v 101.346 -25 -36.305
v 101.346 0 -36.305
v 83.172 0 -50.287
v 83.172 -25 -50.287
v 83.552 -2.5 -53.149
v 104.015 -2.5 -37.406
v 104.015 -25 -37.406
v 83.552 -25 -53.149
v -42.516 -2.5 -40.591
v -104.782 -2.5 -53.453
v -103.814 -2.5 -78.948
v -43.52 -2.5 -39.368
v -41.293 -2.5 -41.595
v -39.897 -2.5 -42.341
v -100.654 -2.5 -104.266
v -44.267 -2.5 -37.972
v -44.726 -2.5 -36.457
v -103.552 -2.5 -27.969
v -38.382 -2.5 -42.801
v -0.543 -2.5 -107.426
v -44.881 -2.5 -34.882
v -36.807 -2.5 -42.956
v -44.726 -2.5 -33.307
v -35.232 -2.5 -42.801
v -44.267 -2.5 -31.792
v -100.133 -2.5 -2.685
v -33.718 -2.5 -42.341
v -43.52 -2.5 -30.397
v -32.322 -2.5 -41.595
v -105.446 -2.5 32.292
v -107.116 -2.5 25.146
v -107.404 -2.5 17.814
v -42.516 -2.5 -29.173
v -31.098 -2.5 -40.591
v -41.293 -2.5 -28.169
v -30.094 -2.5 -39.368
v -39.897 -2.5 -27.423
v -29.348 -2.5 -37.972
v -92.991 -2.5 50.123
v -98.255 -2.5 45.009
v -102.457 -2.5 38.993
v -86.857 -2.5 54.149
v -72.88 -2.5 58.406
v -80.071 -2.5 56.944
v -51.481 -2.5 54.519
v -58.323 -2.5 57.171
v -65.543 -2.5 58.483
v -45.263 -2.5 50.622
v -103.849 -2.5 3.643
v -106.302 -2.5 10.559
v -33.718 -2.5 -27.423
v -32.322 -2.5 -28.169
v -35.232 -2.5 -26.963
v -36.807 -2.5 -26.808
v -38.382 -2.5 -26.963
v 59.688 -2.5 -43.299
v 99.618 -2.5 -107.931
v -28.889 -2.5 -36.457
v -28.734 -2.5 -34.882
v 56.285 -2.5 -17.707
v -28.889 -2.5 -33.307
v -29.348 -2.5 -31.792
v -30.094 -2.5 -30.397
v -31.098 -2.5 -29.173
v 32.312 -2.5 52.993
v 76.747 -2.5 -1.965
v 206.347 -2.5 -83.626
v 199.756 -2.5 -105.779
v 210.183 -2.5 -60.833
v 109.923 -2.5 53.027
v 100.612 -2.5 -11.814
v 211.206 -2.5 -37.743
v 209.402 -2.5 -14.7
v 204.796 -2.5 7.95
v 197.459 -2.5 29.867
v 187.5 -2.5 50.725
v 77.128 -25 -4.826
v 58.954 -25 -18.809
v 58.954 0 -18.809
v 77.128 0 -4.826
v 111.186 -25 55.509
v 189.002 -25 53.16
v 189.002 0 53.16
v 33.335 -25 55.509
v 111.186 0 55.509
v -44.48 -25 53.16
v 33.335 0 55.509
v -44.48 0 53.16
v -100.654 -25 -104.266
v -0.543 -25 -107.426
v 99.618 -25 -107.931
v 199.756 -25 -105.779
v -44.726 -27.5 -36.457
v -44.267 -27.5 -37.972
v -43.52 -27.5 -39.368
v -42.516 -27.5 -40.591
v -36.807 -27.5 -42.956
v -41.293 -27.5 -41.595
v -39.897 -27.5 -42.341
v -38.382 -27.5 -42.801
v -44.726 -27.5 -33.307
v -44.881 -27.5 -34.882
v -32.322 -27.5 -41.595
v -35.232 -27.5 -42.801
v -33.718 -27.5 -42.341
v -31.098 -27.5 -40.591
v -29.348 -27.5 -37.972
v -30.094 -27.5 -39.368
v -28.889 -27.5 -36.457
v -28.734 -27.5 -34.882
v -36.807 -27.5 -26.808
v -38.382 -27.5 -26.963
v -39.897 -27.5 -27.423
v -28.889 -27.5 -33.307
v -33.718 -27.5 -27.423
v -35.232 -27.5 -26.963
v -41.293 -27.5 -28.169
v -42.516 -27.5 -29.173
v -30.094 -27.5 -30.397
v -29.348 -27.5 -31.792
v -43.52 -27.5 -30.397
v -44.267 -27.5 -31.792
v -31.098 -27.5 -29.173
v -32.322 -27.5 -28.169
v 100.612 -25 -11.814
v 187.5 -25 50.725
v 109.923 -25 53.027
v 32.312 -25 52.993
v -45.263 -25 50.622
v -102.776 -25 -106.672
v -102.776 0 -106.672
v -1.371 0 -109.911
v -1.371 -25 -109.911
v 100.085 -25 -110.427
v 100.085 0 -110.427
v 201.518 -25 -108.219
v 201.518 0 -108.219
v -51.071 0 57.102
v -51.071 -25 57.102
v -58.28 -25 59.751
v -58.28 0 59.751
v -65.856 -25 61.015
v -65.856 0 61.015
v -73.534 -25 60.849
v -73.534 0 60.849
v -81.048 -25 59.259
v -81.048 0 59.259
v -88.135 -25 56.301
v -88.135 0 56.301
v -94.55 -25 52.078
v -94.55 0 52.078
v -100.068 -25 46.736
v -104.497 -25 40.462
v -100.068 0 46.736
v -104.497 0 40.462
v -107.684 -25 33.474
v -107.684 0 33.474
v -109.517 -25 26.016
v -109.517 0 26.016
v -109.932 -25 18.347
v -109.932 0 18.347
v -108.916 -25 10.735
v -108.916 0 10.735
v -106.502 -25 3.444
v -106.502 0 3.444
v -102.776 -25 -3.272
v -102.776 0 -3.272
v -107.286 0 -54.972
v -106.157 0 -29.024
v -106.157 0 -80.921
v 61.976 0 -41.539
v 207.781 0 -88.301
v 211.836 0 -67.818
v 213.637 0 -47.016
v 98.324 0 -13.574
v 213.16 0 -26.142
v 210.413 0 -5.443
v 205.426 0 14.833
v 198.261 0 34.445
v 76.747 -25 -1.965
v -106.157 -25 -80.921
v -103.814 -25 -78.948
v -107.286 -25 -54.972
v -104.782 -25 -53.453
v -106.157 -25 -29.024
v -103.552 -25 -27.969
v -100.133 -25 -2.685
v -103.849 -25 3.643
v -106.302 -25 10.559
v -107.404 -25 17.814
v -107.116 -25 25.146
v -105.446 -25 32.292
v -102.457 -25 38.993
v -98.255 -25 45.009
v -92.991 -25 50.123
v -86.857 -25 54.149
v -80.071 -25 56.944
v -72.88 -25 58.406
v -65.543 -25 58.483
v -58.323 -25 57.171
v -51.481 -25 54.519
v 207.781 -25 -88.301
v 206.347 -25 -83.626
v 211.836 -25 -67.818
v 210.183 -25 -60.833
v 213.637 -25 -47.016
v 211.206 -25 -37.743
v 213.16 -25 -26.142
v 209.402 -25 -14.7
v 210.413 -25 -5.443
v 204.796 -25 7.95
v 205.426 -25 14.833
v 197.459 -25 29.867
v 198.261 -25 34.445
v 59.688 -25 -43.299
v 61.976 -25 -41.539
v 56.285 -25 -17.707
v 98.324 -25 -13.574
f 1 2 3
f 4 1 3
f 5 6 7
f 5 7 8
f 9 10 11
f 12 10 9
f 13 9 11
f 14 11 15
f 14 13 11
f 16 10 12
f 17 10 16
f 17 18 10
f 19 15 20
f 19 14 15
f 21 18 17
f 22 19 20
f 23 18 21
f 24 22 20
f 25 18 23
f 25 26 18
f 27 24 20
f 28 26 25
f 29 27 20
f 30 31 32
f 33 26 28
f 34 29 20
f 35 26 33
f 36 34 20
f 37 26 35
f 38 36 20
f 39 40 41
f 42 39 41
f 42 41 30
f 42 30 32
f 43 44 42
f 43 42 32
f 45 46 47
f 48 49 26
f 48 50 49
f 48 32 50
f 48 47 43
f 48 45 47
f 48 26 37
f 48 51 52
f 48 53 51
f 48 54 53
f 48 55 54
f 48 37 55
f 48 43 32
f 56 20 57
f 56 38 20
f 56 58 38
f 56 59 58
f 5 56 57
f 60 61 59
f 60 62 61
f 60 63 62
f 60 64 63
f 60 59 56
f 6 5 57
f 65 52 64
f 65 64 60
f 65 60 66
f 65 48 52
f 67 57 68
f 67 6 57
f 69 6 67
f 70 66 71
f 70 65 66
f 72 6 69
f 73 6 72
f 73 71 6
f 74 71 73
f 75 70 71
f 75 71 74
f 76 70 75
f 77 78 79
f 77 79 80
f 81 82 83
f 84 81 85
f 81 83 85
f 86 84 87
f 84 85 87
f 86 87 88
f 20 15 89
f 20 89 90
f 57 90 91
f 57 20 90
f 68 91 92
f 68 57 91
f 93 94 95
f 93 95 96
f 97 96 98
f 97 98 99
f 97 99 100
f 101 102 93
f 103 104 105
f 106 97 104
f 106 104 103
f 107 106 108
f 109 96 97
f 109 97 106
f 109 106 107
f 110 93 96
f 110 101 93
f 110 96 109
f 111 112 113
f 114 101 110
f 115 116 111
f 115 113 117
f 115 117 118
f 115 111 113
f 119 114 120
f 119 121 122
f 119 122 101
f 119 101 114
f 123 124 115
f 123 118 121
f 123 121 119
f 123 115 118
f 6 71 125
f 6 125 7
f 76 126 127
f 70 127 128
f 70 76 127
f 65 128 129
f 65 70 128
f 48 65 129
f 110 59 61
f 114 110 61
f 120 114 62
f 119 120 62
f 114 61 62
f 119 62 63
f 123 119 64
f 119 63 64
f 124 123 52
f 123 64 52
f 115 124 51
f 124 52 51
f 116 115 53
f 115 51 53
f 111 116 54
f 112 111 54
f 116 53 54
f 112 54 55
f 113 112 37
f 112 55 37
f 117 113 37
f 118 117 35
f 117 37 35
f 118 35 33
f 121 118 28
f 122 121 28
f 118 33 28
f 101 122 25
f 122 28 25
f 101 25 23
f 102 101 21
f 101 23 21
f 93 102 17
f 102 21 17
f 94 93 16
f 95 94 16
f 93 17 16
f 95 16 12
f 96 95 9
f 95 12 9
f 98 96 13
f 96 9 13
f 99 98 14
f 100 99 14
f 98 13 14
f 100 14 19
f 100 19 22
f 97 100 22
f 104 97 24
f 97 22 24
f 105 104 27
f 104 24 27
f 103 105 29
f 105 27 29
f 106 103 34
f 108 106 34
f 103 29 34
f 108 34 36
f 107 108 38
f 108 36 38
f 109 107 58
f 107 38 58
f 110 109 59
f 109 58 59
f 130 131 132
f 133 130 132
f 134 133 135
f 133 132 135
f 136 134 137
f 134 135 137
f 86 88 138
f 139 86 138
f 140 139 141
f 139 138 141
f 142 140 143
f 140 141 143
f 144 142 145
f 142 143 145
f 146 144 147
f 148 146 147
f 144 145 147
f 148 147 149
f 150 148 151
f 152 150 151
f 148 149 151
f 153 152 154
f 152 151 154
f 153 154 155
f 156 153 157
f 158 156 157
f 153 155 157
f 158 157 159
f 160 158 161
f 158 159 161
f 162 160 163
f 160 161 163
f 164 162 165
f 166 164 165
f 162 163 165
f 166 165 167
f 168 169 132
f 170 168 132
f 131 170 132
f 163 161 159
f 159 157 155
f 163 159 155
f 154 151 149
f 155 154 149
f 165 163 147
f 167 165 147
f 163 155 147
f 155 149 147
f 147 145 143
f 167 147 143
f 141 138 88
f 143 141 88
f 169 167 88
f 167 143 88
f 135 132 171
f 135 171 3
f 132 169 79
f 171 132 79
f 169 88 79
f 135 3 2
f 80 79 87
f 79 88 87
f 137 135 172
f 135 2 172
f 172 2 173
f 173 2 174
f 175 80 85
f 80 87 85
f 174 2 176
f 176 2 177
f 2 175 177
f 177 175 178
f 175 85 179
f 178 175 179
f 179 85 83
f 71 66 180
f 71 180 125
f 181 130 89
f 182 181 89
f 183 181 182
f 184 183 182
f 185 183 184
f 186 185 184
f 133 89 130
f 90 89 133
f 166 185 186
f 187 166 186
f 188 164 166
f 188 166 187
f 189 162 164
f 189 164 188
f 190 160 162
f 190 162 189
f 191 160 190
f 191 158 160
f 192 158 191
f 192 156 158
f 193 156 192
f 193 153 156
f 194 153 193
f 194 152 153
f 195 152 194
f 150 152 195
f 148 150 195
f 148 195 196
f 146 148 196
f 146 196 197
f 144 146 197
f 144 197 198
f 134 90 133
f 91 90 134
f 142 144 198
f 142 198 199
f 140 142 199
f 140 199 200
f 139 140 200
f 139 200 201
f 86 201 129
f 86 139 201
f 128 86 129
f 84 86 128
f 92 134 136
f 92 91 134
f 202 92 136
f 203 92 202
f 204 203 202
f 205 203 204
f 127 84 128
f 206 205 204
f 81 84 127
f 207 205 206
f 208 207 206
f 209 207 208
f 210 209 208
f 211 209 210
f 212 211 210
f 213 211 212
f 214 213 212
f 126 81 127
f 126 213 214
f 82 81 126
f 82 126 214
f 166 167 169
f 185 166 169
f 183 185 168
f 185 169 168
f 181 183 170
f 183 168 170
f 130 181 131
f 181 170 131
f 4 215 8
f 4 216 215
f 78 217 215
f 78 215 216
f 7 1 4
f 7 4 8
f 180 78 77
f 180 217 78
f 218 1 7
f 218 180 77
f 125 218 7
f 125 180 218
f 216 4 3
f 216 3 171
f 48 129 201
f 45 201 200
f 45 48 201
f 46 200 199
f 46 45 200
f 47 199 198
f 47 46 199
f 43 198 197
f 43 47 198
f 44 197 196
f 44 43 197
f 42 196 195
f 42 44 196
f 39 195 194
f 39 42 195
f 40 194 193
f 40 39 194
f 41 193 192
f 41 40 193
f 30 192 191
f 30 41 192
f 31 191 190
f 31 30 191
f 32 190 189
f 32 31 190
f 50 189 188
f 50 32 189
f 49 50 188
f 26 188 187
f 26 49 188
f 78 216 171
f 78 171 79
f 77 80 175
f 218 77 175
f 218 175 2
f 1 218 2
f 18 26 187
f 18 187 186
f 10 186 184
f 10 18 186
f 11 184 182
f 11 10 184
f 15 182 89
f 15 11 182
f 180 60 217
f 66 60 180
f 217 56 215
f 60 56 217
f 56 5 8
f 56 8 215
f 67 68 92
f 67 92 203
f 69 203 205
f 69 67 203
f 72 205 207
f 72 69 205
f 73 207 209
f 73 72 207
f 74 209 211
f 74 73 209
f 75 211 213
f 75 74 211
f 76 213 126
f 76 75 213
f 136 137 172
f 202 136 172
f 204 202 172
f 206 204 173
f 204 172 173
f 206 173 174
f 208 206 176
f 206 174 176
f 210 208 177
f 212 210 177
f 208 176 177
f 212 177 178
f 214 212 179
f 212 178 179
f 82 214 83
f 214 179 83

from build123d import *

# Parameters (mm, degrees)
F1_DEPTH = 25
F2_T     = -2.5
F3_R     = 8.0738328397
F4_DEPTH = 25


with BuildPart() as f1:
    # F0 (on Front) → F1 (new body)
    with BuildSketch(Plane.XZ):
        with BuildLine():
            ThreePointArc((-102.7760443896, -106.6724830235), (49.3553380224, -110.5098127391), (201.5178711407, -108.2193697847))
            ThreePointArc((201.5178711407, -108.2193697847), (213.1602276304, -26.1415825476), (189.002040682, 53.1596761167))
            ThreePointArc((189.002040682, 53.1596761167), (72.260836705, 55.8025234443), (-44.4803672719, 53.1596761167))
            ThreePointArc((-44.4803672719, 53.1596761167), (-97.433719622, 49.5356960569), (-102.7760443896, -3.2719768957))
            ThreePointArc((-102.7760443896, -3.2719768957), (-107.2862833974, -54.9722299596), (-102.7760443896, -106.6724830235))
        make_face()
        Polygon((58.9537048383, -18.80859987), (77.1279207266, -4.826139813), (98.3241942876, -13.5742424376), (101.3462519602, -36.3048051192), (83.1720360719, -50.2872651763), (61.975762511, -41.5391625517), align=None, mode=Mode.SUBTRACT)
    extrude(amount=F1_DEPTH)

    # F2
    f2_openings = [f1.faces().sort_by_distance(p)[0] for p in [
        (49.796749, -25, -27.587864),
    ]]
    offset(amount=F2_T, openings=f2_openings, kind=Kind.INTERSECTION)

    # F3 (on face) → F4 (join)
    with BuildSketch(Plane.XZ.offset(2.5)):
        with Locations((-36.8073508143, -34.8820904728)):
            Circle(F3_R)
    extrude(amount=F4_DEPTH)


solid = f1.part
